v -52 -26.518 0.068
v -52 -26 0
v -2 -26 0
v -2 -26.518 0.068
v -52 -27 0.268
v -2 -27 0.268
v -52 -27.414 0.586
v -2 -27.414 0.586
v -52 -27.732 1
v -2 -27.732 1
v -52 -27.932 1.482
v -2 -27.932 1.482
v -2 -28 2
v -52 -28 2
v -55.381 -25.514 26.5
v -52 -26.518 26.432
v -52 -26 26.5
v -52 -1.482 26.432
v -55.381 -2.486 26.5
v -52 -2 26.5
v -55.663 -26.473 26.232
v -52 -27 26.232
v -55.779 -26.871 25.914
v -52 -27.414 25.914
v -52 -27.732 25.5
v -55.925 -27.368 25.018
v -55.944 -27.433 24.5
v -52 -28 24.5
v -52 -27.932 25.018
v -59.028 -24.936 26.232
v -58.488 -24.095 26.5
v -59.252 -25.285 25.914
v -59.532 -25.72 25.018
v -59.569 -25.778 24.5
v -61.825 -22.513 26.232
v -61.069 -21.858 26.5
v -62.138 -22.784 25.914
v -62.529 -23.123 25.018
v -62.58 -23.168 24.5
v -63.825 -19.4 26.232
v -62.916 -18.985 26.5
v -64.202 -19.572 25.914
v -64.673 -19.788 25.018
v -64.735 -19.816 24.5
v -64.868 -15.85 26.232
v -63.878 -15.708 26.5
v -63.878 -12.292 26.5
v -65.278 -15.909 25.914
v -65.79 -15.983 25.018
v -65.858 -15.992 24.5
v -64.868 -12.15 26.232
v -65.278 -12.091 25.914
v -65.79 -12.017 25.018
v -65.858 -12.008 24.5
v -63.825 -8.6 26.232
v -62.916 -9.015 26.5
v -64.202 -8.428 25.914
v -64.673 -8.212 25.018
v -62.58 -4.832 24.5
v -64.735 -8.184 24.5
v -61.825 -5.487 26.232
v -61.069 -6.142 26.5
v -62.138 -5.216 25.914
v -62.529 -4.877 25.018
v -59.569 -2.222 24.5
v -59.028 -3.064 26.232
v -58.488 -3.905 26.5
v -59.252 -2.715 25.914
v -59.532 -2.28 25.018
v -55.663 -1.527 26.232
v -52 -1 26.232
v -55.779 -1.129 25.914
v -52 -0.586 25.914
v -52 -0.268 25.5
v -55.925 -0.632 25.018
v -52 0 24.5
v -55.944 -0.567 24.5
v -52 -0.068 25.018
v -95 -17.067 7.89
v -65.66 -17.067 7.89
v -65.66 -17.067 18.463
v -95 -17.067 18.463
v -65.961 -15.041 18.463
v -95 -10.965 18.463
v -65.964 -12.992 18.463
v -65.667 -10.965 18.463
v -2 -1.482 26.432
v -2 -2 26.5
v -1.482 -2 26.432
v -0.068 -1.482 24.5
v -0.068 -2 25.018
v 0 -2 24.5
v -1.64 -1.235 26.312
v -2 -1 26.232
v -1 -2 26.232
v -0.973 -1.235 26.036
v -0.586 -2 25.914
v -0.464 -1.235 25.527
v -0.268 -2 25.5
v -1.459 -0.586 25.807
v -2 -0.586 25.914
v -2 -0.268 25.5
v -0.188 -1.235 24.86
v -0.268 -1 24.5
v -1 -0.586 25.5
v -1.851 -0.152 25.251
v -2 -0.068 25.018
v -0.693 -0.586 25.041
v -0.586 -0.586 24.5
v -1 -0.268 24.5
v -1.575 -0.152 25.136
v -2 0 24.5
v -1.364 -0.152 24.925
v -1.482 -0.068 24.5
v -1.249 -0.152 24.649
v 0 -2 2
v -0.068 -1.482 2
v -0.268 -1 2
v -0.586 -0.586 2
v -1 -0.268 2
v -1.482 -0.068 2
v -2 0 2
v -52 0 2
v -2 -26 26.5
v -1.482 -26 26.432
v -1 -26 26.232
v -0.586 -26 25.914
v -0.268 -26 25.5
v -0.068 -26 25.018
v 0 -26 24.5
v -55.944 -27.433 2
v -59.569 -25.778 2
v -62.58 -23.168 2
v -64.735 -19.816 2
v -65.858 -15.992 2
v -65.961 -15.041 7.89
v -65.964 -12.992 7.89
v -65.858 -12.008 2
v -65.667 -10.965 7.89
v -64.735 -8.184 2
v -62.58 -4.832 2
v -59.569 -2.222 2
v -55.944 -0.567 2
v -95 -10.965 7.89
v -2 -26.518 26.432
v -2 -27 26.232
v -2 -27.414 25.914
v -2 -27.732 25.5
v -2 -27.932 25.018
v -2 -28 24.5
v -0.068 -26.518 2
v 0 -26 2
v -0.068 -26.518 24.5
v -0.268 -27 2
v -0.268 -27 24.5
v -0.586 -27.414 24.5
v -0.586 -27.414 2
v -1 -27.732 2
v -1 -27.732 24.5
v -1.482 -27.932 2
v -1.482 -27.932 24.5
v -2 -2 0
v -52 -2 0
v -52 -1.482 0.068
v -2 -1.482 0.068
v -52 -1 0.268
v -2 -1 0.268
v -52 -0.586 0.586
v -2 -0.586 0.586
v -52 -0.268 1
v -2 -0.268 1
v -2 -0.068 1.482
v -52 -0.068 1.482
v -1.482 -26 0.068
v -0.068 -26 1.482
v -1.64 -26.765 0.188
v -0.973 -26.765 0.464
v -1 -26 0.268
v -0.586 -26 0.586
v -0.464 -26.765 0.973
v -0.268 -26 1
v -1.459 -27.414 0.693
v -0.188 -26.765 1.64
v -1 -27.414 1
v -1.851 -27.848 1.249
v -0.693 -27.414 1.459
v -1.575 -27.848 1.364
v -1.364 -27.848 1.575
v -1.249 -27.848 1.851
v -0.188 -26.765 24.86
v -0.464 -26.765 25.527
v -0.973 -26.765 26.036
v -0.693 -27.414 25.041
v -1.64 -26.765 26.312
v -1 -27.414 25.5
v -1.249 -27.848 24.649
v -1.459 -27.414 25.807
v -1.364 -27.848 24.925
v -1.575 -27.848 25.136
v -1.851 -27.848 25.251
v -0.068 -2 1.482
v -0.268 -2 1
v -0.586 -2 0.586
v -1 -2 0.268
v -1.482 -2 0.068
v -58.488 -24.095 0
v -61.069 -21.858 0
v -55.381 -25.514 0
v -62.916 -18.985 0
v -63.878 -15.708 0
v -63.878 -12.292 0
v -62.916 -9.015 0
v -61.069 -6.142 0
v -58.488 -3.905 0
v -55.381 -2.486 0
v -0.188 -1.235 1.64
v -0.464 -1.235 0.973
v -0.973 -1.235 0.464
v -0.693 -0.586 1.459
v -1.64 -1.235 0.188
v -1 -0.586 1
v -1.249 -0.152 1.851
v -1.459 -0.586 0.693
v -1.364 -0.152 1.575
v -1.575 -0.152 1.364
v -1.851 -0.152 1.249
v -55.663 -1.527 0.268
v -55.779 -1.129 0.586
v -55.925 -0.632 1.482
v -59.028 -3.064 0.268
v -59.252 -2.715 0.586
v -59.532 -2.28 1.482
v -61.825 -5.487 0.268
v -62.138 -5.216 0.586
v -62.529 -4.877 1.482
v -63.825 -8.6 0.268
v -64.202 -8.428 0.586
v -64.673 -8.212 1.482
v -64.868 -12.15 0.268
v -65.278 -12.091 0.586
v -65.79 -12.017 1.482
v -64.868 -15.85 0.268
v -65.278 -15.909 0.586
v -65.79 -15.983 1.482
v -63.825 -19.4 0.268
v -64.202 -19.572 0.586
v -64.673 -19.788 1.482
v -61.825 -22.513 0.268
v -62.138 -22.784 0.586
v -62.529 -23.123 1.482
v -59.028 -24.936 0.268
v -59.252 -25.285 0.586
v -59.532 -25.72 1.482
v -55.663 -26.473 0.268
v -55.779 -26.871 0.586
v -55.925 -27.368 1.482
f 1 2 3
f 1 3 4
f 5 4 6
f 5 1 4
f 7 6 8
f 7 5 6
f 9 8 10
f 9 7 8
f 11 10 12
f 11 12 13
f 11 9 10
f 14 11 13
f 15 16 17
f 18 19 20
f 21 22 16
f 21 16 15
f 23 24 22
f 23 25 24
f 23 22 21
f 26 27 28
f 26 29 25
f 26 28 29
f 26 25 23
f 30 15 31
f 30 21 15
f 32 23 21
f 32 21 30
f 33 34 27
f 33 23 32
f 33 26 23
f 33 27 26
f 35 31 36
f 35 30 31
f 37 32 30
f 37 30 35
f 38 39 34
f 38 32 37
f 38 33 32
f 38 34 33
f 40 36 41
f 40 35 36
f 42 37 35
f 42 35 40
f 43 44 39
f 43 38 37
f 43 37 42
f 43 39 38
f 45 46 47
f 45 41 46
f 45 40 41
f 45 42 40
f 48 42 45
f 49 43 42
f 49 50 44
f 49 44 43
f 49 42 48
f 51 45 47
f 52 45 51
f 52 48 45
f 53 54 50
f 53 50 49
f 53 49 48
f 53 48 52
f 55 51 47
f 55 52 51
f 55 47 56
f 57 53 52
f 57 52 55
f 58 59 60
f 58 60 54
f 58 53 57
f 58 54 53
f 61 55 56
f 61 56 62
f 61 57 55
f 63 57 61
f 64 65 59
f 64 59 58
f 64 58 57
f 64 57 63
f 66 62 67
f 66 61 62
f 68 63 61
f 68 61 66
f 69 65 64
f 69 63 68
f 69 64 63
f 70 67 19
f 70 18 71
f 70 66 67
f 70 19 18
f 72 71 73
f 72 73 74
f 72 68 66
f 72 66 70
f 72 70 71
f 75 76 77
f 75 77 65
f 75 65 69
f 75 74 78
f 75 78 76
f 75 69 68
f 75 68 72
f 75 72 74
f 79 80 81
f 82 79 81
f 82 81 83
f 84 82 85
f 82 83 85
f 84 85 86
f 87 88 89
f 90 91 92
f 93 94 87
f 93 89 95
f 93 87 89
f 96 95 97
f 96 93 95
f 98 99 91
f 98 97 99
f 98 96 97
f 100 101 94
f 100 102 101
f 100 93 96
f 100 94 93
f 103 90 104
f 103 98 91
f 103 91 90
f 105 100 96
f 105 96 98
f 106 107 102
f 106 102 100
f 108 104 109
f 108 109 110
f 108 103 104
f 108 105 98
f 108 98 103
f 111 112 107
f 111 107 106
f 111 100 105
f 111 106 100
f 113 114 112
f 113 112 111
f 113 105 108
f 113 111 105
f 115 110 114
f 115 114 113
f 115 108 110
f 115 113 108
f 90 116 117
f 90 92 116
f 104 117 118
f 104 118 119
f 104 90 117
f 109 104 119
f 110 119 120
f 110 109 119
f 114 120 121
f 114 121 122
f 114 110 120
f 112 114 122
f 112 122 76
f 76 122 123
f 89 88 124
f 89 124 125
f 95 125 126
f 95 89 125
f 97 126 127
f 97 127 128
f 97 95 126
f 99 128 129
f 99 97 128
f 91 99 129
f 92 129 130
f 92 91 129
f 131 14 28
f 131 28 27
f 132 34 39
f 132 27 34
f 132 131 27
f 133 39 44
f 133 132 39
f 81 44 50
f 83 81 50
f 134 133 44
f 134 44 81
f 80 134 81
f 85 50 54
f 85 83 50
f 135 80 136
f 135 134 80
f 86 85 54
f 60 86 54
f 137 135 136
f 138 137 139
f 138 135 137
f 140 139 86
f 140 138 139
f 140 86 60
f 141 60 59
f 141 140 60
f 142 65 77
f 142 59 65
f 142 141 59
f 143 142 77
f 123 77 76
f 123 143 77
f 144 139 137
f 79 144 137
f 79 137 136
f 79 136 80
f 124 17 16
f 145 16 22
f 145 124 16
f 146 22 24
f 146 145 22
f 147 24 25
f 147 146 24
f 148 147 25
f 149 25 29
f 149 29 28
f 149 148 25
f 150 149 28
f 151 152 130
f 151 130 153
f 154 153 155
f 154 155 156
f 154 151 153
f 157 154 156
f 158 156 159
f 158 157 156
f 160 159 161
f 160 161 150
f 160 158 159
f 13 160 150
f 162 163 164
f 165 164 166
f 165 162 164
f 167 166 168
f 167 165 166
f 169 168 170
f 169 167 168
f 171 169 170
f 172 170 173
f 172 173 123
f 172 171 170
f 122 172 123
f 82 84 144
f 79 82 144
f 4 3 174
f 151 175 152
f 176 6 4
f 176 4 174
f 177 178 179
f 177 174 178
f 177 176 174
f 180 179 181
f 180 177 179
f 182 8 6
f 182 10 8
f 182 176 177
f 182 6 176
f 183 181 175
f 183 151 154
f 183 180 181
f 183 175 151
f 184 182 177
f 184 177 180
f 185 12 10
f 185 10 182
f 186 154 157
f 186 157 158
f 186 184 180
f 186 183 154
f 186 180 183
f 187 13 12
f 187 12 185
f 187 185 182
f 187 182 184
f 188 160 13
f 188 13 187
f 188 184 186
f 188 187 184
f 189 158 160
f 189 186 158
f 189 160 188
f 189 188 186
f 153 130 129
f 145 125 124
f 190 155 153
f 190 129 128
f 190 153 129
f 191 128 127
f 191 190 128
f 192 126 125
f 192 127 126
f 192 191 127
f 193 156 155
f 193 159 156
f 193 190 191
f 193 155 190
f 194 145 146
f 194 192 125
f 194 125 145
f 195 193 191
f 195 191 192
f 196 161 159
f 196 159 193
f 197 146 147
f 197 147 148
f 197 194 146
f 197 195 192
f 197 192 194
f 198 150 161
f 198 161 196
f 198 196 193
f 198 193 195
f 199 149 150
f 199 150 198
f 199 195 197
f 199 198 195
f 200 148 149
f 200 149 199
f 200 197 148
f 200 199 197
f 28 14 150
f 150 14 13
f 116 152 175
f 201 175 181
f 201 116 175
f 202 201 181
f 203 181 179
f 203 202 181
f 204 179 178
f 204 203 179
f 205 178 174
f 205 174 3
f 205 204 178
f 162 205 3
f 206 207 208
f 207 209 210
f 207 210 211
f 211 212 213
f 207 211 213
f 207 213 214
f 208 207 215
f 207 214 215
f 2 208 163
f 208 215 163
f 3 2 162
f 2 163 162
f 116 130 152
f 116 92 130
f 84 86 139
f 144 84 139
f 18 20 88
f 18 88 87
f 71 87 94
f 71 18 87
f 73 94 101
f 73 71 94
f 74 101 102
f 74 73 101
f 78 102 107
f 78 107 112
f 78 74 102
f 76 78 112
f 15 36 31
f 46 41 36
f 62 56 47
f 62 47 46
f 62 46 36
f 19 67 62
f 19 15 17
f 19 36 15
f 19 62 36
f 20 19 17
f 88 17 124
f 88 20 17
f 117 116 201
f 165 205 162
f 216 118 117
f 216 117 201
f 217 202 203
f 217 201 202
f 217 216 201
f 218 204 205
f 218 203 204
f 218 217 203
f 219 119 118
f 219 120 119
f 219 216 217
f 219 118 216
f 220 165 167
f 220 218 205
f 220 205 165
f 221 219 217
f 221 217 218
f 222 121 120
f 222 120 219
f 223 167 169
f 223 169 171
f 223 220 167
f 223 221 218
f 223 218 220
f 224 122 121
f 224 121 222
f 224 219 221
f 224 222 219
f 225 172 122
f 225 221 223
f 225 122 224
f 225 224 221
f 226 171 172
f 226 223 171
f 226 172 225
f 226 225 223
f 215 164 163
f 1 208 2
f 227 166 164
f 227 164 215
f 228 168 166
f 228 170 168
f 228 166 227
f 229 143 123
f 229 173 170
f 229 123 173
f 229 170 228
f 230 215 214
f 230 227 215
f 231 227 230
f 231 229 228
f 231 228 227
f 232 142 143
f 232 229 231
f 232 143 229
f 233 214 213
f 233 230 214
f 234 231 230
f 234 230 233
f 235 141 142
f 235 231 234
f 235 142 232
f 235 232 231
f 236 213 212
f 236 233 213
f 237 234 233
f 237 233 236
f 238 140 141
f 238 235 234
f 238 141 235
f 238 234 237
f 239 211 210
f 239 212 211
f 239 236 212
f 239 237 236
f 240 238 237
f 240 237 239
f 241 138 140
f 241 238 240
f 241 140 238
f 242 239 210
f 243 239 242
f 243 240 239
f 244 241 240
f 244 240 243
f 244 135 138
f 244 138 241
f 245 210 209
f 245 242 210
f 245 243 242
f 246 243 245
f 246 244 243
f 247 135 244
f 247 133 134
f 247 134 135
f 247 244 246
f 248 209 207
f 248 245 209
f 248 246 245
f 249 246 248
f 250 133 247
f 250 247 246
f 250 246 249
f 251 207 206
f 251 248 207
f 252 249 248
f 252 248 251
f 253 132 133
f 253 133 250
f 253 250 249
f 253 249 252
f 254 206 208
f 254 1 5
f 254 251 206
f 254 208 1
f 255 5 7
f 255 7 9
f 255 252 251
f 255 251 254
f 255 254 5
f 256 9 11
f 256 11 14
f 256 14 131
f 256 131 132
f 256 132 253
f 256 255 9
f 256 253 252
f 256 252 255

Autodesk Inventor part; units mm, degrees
ref_plane "YZ Plane" through (0, 0, 0) normal (1, 0, 0) x (0, 1, 0)
ref_plane "XZ Plane" through (0, 0, 0) normal (0, 1, 0) x (-1, 0, 0)
ref_plane "XY Plane" through (0, 0, 0) normal (0, 0, 1) x (1, 0, 0)
sketch "Эскиз1" plane through (0, 0, 0) normal (0, 0, 1) x (1, 0, 0)
  line L0 (0, 0) -> (-52, 0)
  line L1 (-52, 0) -> (-52, -28) construction
  line L2 (-52, -28) -> (0, -28)
  line L3 (0, -28) -> (0, 0)
  arc A0 (-52, 0) -> (-52, -28) centre (-52, -14) ccw
  point P0 (-66, -14)
  dimension "d1" = 28
  dimension "d2" = 66
extrude "Выдавливание1" add sketch "Эскиз1" along normal blind 26.5
fillet "Сопряжение1" radius 2 2 edges at (0, -14, 26.5) (0, -14, 0)
fillet "Сопряжение2" radius 2 12 edges at (-0.5858, 0, 25.9142) (-27, 0, 26.5) (-66, -14, 26.5) (-27, -28, 26.5) (-0.5858, -28, 25.9142) (0, -28, 13.25) (-0.5858, -28, 0.5858) (-27, -28, 0) (-66, -14, 0) (-27, 0, 0) (-0.5858, 0, 0.5858) (0, 0, 13.25)
sketch "Эскиз2" plane through (0, -26, 24.5) normal (1, 0, 0) x (0, 0, -1)
  line L0 (6.0366, 15.0348) -> (16.61, 15.0348)
  line L1 (16.61, 15.0348) -> (16.61, 8.9331)
  line L2 (16.61, 8.9331) -> (6.0366, 8.9331)
  line L3 (6.0366, 8.9331) -> (6.0366, 15.0348)
  point P0 (24.5, 26)
extrude "Выдавливание2" add sketch "Эскиз2" against normal blind 95
properties part number "bat_sketch"
